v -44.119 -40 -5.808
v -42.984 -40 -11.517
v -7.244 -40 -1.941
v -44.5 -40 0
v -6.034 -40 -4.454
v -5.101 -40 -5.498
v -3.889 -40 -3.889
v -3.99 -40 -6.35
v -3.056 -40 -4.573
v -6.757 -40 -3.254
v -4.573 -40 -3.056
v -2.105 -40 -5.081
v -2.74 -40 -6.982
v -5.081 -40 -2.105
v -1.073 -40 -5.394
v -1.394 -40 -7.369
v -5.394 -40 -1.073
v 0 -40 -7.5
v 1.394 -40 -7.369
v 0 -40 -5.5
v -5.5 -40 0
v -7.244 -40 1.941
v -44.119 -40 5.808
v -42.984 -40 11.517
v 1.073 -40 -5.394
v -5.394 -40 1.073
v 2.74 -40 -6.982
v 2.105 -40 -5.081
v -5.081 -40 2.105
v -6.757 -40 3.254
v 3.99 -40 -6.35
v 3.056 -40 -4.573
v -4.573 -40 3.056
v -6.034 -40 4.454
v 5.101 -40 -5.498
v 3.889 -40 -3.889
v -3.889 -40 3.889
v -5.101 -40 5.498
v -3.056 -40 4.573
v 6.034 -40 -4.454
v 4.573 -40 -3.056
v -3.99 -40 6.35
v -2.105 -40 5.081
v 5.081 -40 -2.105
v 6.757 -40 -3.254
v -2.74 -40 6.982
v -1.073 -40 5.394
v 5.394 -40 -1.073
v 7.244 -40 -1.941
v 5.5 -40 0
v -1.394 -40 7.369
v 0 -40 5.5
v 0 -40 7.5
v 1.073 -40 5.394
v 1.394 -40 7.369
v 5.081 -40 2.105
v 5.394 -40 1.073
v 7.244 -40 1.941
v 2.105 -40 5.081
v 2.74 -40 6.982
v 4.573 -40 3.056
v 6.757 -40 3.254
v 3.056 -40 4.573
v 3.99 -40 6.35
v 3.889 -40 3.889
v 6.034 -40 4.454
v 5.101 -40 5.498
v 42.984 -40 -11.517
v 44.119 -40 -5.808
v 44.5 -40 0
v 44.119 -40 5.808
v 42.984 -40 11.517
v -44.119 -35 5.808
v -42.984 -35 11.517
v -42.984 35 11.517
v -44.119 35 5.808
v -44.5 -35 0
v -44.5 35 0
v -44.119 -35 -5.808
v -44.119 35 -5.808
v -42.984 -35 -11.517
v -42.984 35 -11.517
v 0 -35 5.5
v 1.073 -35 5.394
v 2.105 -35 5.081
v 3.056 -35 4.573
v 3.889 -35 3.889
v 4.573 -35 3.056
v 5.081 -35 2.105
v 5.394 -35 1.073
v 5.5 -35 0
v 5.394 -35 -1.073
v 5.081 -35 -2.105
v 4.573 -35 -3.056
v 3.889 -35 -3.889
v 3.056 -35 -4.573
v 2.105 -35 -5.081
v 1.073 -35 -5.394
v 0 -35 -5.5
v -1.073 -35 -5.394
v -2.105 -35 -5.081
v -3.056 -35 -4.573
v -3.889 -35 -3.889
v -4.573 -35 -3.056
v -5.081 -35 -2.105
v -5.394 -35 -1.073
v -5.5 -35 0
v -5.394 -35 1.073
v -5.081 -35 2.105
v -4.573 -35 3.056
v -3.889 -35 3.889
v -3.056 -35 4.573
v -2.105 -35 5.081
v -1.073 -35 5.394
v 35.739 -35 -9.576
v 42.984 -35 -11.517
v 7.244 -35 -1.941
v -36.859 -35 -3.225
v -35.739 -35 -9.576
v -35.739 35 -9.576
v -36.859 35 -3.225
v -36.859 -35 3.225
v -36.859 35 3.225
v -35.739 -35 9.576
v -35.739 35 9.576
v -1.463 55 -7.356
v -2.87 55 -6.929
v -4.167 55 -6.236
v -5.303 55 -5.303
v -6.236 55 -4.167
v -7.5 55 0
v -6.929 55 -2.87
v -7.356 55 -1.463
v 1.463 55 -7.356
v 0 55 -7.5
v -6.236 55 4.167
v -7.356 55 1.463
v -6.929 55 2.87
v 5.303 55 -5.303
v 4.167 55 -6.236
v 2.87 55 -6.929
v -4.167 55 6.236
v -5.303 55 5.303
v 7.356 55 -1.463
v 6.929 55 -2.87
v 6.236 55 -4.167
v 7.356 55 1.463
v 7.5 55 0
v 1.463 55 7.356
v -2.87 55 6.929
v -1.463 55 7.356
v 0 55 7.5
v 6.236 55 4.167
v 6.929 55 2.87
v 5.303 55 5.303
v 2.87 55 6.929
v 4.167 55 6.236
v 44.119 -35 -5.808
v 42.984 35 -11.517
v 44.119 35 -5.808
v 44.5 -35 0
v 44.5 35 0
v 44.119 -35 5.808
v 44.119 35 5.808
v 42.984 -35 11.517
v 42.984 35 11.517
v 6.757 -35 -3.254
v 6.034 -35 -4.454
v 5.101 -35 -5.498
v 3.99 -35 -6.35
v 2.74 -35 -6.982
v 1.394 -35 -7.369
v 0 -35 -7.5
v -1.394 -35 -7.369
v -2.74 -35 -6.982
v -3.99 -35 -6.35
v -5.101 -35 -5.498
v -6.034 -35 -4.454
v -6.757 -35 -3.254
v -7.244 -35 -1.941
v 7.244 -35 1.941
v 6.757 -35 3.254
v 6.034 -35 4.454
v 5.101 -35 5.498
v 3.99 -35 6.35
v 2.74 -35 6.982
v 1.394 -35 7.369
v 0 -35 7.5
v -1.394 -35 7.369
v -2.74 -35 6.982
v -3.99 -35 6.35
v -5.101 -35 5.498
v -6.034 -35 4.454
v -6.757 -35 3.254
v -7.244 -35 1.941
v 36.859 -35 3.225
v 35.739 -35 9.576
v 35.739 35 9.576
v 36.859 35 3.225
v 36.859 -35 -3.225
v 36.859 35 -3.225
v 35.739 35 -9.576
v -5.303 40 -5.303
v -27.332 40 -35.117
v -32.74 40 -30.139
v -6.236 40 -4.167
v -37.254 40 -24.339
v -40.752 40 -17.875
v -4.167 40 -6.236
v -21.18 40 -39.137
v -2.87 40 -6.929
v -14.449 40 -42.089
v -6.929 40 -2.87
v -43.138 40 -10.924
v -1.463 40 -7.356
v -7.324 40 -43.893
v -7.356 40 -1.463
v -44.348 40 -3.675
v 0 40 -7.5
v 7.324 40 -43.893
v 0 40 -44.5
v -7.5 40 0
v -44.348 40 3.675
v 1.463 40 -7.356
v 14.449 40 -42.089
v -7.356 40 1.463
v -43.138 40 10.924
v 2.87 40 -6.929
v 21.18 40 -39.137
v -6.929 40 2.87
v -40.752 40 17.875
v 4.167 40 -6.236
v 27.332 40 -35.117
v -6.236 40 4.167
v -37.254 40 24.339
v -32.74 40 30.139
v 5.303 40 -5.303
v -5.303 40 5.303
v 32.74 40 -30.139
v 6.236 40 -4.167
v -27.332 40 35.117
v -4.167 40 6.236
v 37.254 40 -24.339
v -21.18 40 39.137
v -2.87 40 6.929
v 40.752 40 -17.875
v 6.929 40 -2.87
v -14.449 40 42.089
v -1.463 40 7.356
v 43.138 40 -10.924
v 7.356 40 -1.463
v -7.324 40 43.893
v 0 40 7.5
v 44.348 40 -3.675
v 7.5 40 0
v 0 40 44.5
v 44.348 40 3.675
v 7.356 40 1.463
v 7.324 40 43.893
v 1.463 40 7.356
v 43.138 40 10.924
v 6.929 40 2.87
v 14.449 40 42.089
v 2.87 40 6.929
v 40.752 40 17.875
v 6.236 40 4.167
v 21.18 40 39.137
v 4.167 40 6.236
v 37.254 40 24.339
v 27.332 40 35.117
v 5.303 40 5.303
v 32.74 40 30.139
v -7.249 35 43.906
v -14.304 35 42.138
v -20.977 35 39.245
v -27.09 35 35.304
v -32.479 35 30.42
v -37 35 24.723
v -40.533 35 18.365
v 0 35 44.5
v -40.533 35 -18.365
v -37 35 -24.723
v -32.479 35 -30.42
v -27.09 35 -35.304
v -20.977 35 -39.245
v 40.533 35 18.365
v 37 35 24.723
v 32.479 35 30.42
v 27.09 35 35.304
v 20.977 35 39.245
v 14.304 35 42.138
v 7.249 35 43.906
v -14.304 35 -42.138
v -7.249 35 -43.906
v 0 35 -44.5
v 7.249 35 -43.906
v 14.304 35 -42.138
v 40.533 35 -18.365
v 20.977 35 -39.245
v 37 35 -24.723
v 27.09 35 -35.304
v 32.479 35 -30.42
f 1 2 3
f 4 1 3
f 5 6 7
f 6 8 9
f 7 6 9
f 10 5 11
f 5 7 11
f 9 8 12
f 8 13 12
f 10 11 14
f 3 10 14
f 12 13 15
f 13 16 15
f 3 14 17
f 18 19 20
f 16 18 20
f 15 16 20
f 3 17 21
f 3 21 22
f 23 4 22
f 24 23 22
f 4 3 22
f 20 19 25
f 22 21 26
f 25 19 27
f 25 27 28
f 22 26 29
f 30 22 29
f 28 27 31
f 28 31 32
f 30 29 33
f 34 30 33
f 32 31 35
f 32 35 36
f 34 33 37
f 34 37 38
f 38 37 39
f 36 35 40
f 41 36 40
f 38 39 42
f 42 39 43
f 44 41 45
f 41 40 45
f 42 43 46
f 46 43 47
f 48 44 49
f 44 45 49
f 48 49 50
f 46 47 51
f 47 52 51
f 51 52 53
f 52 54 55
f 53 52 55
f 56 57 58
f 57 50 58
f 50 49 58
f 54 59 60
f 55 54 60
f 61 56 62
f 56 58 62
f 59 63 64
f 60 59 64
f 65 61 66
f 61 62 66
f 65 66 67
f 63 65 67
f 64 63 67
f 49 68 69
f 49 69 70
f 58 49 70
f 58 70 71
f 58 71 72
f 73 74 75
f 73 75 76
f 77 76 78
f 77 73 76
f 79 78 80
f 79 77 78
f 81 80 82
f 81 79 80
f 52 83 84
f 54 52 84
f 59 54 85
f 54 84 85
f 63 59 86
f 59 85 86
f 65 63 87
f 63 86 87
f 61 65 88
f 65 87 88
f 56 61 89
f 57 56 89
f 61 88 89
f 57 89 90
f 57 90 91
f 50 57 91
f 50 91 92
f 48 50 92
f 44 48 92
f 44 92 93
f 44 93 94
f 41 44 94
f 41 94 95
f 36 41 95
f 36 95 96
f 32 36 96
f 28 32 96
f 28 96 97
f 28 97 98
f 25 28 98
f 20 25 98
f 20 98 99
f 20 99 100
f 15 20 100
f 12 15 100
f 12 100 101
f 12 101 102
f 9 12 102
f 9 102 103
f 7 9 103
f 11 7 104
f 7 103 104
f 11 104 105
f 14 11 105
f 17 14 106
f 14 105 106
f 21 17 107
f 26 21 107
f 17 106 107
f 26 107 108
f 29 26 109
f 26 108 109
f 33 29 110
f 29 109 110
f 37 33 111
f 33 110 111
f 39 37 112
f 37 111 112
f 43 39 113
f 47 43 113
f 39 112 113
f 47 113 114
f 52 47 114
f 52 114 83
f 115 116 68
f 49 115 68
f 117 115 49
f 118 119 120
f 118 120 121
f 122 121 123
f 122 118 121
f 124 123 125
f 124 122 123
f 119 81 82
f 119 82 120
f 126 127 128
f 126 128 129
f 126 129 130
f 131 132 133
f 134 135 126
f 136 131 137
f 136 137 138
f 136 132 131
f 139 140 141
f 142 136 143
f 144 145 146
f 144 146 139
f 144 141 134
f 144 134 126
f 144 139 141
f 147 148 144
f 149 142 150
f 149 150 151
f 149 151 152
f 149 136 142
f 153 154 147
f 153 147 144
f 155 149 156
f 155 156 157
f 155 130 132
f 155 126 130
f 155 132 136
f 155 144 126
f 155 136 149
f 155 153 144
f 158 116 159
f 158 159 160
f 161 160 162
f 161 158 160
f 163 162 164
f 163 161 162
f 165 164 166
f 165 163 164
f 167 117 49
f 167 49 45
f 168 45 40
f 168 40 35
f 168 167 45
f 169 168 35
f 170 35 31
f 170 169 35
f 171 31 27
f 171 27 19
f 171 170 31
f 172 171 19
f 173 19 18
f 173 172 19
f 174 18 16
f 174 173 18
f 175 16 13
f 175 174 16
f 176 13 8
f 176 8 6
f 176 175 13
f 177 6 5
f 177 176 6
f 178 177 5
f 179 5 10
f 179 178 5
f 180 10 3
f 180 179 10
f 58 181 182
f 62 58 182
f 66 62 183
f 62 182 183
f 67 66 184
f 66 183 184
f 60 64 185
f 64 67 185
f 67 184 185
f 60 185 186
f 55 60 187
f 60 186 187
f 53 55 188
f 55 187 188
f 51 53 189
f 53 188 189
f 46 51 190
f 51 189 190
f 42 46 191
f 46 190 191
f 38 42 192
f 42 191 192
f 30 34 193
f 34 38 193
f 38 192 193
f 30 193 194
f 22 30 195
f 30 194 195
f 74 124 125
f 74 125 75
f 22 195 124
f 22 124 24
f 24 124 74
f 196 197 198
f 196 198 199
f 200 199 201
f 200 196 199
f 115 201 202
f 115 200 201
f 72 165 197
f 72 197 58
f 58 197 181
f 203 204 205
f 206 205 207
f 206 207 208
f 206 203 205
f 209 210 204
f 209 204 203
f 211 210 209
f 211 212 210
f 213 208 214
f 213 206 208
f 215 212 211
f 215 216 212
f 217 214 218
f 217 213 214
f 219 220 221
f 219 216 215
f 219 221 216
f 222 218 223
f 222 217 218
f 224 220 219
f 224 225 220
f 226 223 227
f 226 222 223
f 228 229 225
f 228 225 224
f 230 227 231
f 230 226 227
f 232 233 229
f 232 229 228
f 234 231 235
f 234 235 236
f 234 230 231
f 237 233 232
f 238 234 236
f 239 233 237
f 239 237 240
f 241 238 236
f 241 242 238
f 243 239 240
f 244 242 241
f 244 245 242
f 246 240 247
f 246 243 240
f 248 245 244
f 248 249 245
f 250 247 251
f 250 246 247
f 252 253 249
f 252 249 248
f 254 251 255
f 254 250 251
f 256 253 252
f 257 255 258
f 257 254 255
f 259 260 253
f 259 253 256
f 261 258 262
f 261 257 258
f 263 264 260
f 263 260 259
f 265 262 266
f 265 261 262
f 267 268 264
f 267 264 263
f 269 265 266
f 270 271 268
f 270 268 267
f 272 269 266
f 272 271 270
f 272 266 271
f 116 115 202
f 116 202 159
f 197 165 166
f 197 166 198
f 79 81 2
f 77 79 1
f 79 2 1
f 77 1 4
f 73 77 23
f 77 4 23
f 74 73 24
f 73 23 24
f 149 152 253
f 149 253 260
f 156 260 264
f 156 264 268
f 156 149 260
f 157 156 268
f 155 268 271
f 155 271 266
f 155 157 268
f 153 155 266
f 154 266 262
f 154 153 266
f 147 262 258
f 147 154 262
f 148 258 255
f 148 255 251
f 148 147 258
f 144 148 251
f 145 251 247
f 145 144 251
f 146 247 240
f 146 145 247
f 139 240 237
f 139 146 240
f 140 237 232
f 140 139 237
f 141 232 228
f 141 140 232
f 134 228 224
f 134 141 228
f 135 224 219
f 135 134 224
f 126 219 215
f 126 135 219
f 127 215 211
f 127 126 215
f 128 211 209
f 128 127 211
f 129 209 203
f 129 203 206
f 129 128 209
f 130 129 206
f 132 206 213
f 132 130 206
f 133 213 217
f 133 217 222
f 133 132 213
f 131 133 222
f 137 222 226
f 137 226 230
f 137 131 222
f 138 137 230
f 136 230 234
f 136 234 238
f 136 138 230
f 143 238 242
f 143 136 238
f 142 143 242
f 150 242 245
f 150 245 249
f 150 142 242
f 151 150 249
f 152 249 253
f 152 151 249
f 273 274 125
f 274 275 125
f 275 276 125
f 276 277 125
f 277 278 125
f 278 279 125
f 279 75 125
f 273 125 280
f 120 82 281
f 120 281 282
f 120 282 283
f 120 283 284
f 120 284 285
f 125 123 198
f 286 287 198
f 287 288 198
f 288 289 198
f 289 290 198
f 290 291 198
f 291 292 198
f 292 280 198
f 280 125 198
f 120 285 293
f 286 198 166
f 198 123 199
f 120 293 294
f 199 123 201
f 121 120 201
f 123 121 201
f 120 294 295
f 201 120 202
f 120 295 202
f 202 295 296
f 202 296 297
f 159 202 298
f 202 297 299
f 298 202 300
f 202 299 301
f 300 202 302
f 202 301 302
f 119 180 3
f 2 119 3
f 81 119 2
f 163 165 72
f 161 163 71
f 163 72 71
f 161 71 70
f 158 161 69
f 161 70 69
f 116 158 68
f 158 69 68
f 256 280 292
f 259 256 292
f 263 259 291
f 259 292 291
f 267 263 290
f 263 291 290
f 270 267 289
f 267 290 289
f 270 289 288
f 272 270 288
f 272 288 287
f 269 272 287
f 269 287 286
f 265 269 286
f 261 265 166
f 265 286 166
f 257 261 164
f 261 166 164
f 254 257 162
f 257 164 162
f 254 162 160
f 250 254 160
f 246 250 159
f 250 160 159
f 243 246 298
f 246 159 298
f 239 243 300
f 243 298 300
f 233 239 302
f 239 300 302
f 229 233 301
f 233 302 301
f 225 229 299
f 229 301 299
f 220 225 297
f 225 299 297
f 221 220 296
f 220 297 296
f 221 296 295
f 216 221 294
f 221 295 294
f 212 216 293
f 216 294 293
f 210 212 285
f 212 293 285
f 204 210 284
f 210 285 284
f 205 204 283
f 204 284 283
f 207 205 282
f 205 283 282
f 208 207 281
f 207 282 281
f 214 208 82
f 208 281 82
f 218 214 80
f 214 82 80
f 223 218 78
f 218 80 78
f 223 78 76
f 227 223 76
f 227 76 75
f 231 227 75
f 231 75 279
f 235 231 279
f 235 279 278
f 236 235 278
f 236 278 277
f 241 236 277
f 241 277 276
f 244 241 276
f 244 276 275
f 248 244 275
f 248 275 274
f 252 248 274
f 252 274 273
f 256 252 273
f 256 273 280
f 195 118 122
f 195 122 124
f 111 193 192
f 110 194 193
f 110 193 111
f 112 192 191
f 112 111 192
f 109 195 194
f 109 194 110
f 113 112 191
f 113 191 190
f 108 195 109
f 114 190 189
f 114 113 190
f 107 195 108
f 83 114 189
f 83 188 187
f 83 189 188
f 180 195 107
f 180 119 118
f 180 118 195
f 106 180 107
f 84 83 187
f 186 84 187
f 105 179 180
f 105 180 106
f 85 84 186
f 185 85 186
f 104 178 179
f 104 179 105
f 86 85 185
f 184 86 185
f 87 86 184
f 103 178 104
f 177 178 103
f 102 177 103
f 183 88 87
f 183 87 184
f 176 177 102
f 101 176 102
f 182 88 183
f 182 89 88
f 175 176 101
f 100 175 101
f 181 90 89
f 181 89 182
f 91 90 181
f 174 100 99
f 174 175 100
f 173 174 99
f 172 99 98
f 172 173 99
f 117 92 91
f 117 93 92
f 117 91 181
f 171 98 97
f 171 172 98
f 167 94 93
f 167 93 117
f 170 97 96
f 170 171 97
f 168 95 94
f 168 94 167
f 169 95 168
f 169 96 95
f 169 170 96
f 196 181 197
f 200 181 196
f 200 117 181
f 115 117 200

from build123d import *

# Parameters (mm, degrees)
SALIENTE_EXTRUIR1_DEPTH      = 40
SALIENTE_EXTRUIR1_DEPTH_BACK = 40
CROQUIS1_R                   = 44.5
CORTAR_EXTRUIR1_DEPTH        = 35
CORTAR_EXTRUIR1_DEPTH_BACK   = 35
CROQUIS2_OUTSIDE_W           = 120.828
CROQUIS2_OUTSIDE_H           = 120.828
CORTAR_EXTRUIR2_REACH        = 99.906
CROQUIS3_R                   = 5.5
SALIENTE_EXTRUIR2_START      = 15
CROQUIS4_R                   = 7.5
SALIENTE_EXTRUIR2_DEPTH      = 15


with BuildPart() as part:
    # Croquis1 → Saliente-Extruir1 (new, two sides: drawn at the far end of the back side and taken through both)
    with BuildSketch(Plane(origin=(0, 0, 0), x_dir=(1, 0, 0), z_dir=(0, 1, 0)).offset(-SALIENTE_EXTRUIR1_DEPTH_BACK)):
        Circle(CROQUIS1_R)
    extrude(amount=SALIENTE_EXTRUIR1_DEPTH + SALIENTE_EXTRUIR1_DEPTH_BACK)

    # Croquis2 outside → Cortar-Extruir1 (cut, two sides: drawn at the far end of the back side and taken through both)
    with BuildSketch(Plane(origin=(0, 0, 0), x_dir=(1, 0, 0), z_dir=(0, 1, 0)).offset(-CORTAR_EXTRUIR1_DEPTH_BACK)):
        Rectangle(CROQUIS2_OUTSIDE_W, CROQUIS2_OUTSIDE_H)
        with BuildLine():
            Line((35.739256, 9.576305), (42.983699, 11.517448))
            ThreePointArc((42.983699, 11.517448), (44.5, 0), (42.983699, -11.517448))
            Line((42.983699, -11.517448), (35.739256, -9.576305))
            ThreePointArc((35.739256, -9.576305), (37, 0), (35.739256, 9.576305))
        make_face(mode=Mode.SUBTRACT)
        with BuildLine():
            Line((-35.739256, -9.576305), (-42.983699, -11.517448))
            ThreePointArc((-42.983699, -11.517448), (-44.5, 0), (-42.983699, 11.517448))
            Line((-42.983699, 11.517448), (-35.739256, 9.576305))
            ThreePointArc((-35.739256, 9.576305), (-37, 0), (-35.739256, -9.576305))
        make_face(mode=Mode.SUBTRACT)
    extrude(amount=CORTAR_EXTRUIR1_DEPTH + CORTAR_EXTRUIR1_DEPTH_BACK, mode=Mode.SUBTRACT)

    # Croquis3 → Cortar-Extruir2 (cut, up to next)
    with BuildSketch(Plane(origin=(0, -35, 0), x_dir=(1, 0, 0), z_dir=(0, 1, 0)), mode=Mode.PRIVATE) as cortar_extruir2_sk1:
        with BuildLine():
            Line((7.244444, 1.941143), (42.983699, 11.517448))
            ThreePointArc((42.983699, 11.517448), (0, 44.5), (-42.983699, 11.517448))
            Line((-42.983699, 11.517448), (-7.244444, 1.941143))
            ThreePointArc((-7.244444, 1.941143), (0, 7.5), (7.244444, 1.941143))
        make_face()
    cortar_extruir2_tool1 = extrude(cortar_extruir2_sk1.sketch, amount=-CORTAR_EXTRUIR2_REACH, mode=Mode.PRIVATE) & part.part
    # Croquis3 → Cortar-Extruir2 (cut, up to next)
    with BuildSketch(Plane(origin=(0, -35, 0), x_dir=(1, 0, 0), z_dir=(0, 1, 0)), mode=Mode.PRIVATE) as cortar_extruir2_sk2:
        with BuildLine():
            ThreePointArc((-42.983699, -11.517448), (0, -44.5), (42.983699, -11.517448))
            Line((42.983699, -11.517448), (7.244444, -1.941143))
            ThreePointArc((7.244444, -1.941143), (0, -7.5), (-7.244444, -1.941143))
            Line((-7.244444, -1.941143), (-42.983699, -11.517448))
        make_face()
    cortar_extruir2_tool2 = extrude(cortar_extruir2_sk2.sketch, amount=-CORTAR_EXTRUIR2_REACH, mode=Mode.PRIVATE) & part.part
    # Croquis3 → Cortar-Extruir2 (cut, up to next)
    with BuildSketch(Plane(origin=(0, -35, 0), x_dir=(1, 0, 0), z_dir=(0, 1, 0)), mode=Mode.PRIVATE) as cortar_extruir2_sk3:
        Circle(CROQUIS3_R)
    cortar_extruir2_tool3 = extrude(cortar_extruir2_sk3.sketch, amount=-CORTAR_EXTRUIR2_REACH, mode=Mode.PRIVATE) & part.part
    add(cortar_extruir2_tool1.solids().sort_by_distance((0, -35, -22.423567))[0], mode=Mode.SUBTRACT)
    add(cortar_extruir2_tool2.solids().sort_by_distance((0, -35, 22.423567))[0], mode=Mode.SUBTRACT)
    add(cortar_extruir2_tool3.solids().sort_by_distance((0, -35, 0))[0], mode=Mode.SUBTRACT)

    # Croquis4 → Saliente-Extruir2 (add)
    with BuildSketch(Plane(origin=(0, 40, 0), x_dir=(1, 0, 0), z_dir=(0, 1, 0)).offset(SALIENTE_EXTRUIR2_START)):
        Circle(CROQUIS4_R)
    extrude(amount=-SALIENTE_EXTRUIR2_DEPTH)


solid = part.part
